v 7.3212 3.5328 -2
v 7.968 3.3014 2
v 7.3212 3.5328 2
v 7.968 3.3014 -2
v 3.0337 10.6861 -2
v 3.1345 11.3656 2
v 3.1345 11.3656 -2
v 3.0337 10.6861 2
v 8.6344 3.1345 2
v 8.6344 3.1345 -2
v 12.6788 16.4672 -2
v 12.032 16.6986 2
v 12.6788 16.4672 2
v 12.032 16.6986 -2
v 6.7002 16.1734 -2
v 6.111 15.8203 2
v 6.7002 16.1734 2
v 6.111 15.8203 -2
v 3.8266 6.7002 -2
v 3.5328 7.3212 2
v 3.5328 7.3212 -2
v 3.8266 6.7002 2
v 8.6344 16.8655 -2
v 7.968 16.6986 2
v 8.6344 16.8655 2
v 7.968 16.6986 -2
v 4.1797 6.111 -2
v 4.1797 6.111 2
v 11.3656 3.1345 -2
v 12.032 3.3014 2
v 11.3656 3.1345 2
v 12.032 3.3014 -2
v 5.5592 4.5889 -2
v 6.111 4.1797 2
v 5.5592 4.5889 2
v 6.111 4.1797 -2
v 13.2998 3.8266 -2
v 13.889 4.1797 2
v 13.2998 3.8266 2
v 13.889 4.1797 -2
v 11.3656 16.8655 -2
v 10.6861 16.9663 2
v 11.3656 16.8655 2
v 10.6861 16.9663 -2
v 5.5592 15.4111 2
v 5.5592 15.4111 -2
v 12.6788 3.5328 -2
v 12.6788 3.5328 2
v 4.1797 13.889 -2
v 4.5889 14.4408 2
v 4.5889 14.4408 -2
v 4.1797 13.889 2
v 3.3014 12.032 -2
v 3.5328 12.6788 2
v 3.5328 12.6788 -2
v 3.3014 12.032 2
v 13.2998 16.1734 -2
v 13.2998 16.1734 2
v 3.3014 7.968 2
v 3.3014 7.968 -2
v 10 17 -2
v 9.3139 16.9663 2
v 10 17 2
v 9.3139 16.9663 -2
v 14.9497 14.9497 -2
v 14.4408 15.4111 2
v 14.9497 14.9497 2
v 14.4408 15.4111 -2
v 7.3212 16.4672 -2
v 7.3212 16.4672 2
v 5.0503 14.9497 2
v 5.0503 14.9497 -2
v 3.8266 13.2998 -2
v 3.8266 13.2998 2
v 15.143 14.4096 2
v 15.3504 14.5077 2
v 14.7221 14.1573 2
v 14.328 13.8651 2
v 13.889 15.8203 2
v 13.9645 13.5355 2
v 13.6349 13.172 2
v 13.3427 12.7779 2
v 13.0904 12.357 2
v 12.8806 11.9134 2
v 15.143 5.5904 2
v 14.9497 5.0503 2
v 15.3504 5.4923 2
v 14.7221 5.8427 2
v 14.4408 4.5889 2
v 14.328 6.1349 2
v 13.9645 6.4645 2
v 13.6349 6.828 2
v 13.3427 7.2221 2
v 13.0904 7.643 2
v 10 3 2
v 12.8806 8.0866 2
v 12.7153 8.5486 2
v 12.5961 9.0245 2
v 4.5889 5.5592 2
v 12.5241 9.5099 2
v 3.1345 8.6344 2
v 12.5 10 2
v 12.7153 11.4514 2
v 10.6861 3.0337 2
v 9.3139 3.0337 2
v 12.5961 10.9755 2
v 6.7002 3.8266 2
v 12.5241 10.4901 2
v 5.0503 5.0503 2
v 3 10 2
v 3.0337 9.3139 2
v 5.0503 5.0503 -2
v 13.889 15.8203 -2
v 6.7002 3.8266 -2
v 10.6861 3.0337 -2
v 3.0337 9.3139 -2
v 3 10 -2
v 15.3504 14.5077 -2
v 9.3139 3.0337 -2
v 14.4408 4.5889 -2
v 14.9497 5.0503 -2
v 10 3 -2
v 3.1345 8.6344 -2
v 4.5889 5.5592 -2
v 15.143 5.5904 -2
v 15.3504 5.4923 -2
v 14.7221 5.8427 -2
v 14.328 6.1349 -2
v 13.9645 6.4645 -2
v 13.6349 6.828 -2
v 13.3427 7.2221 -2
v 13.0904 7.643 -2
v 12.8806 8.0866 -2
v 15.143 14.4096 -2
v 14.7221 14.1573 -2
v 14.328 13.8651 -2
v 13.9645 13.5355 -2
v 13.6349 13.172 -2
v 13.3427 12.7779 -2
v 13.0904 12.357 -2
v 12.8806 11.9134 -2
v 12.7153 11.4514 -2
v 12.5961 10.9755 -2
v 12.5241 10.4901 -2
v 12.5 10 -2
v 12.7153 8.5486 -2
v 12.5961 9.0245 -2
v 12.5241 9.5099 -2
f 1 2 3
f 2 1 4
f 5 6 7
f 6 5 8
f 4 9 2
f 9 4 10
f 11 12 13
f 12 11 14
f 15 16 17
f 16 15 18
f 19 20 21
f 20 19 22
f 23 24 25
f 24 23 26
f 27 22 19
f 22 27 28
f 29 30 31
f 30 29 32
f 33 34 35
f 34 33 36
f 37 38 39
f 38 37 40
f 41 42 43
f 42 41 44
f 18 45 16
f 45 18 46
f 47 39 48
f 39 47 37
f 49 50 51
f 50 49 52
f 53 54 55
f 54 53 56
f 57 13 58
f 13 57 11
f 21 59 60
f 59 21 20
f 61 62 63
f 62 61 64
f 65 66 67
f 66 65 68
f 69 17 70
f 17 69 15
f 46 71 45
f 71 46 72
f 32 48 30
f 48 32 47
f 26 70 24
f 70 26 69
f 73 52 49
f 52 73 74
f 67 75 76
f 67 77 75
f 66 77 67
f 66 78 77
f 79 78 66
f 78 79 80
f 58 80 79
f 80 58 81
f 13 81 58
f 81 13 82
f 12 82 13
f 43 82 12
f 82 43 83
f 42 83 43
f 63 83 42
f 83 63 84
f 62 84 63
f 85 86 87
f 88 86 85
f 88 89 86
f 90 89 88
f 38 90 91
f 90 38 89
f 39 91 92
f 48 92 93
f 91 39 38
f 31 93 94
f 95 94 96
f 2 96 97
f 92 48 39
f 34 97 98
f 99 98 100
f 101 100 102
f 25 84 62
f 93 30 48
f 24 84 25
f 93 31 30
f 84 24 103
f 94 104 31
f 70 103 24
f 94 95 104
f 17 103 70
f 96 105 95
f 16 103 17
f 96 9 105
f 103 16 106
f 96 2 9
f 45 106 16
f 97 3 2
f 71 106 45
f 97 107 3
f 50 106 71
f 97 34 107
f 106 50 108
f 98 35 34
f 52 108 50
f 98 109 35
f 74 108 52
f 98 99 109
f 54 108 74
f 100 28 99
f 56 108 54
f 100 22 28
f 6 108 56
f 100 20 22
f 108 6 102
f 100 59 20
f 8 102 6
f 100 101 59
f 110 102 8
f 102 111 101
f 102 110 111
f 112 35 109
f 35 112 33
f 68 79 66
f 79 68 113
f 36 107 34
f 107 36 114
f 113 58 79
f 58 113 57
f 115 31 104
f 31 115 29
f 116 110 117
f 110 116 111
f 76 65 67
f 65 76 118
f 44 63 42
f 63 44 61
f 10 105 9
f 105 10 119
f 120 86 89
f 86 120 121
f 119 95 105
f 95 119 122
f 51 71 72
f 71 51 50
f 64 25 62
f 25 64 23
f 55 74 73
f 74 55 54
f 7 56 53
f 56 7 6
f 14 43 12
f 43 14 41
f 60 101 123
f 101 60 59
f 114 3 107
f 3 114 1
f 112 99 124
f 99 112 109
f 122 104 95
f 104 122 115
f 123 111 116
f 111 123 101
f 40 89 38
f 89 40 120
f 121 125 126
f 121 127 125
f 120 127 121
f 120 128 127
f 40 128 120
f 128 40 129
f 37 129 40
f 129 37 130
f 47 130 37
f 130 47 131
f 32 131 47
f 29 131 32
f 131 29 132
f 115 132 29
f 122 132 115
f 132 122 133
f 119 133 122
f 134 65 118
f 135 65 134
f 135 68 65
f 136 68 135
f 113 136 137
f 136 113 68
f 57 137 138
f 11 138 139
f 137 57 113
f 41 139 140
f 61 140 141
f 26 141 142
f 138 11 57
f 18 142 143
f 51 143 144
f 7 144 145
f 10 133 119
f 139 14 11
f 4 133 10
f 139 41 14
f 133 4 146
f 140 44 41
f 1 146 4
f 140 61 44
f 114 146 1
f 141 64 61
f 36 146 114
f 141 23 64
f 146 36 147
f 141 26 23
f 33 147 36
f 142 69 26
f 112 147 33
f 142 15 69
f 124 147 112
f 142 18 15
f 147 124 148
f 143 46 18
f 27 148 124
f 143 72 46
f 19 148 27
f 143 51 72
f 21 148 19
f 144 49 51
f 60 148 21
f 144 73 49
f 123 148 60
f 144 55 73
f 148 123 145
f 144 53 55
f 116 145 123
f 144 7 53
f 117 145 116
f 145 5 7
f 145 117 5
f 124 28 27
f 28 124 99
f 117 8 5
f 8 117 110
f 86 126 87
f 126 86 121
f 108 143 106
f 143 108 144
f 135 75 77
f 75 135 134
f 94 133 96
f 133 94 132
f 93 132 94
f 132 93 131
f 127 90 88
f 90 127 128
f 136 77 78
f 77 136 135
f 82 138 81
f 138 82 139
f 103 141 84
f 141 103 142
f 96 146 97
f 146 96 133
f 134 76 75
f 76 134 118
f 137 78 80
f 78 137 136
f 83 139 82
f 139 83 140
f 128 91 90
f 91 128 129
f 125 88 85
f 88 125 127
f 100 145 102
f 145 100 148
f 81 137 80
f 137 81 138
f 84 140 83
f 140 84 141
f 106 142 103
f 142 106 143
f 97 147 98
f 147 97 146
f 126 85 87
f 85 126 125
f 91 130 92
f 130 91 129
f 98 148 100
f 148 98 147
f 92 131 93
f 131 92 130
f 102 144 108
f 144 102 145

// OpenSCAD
$fn = 64;

mm = 1;
cm = 10*mm;

d = 15*mm;

// difference() {
//   cube([4*cm, 2*cm, 2*mm]);

//   translate([
//     1*cm,
//     1*cm,
//     0
//   ])
//   #cylinder(d=d, h = 10*cm, center = true);

//   translate([
//     3*cm,
//     1*cm,
//     0
//   ])
//   #cylinder(d=d, h = 10*cm, center = true);

//   translate([
//     2*cm,
//     1*cm,
//     0
//   ])
//   #cube([2*cm, 1*cm, 10*cm], center = true);
// }

difference() {
  translate([
    1*cm,
    1*cm,
    0
  ])
  cylinder(d=d-1*mm, h = 4*mm, center = true);

  translate([
    1*cm + d/2,
    1*cm,
    1*cm])
  {
    cylinder(d = 10*mm, h = 10*cm, center = true);
    // rotate([0,0,45])
    // #cube([10*mm, 10*mm, 10*cm], center =  true);
  }
}

// cylinder(d = 10*mm - 0.5*mm, h = 4*mm, center = true);
